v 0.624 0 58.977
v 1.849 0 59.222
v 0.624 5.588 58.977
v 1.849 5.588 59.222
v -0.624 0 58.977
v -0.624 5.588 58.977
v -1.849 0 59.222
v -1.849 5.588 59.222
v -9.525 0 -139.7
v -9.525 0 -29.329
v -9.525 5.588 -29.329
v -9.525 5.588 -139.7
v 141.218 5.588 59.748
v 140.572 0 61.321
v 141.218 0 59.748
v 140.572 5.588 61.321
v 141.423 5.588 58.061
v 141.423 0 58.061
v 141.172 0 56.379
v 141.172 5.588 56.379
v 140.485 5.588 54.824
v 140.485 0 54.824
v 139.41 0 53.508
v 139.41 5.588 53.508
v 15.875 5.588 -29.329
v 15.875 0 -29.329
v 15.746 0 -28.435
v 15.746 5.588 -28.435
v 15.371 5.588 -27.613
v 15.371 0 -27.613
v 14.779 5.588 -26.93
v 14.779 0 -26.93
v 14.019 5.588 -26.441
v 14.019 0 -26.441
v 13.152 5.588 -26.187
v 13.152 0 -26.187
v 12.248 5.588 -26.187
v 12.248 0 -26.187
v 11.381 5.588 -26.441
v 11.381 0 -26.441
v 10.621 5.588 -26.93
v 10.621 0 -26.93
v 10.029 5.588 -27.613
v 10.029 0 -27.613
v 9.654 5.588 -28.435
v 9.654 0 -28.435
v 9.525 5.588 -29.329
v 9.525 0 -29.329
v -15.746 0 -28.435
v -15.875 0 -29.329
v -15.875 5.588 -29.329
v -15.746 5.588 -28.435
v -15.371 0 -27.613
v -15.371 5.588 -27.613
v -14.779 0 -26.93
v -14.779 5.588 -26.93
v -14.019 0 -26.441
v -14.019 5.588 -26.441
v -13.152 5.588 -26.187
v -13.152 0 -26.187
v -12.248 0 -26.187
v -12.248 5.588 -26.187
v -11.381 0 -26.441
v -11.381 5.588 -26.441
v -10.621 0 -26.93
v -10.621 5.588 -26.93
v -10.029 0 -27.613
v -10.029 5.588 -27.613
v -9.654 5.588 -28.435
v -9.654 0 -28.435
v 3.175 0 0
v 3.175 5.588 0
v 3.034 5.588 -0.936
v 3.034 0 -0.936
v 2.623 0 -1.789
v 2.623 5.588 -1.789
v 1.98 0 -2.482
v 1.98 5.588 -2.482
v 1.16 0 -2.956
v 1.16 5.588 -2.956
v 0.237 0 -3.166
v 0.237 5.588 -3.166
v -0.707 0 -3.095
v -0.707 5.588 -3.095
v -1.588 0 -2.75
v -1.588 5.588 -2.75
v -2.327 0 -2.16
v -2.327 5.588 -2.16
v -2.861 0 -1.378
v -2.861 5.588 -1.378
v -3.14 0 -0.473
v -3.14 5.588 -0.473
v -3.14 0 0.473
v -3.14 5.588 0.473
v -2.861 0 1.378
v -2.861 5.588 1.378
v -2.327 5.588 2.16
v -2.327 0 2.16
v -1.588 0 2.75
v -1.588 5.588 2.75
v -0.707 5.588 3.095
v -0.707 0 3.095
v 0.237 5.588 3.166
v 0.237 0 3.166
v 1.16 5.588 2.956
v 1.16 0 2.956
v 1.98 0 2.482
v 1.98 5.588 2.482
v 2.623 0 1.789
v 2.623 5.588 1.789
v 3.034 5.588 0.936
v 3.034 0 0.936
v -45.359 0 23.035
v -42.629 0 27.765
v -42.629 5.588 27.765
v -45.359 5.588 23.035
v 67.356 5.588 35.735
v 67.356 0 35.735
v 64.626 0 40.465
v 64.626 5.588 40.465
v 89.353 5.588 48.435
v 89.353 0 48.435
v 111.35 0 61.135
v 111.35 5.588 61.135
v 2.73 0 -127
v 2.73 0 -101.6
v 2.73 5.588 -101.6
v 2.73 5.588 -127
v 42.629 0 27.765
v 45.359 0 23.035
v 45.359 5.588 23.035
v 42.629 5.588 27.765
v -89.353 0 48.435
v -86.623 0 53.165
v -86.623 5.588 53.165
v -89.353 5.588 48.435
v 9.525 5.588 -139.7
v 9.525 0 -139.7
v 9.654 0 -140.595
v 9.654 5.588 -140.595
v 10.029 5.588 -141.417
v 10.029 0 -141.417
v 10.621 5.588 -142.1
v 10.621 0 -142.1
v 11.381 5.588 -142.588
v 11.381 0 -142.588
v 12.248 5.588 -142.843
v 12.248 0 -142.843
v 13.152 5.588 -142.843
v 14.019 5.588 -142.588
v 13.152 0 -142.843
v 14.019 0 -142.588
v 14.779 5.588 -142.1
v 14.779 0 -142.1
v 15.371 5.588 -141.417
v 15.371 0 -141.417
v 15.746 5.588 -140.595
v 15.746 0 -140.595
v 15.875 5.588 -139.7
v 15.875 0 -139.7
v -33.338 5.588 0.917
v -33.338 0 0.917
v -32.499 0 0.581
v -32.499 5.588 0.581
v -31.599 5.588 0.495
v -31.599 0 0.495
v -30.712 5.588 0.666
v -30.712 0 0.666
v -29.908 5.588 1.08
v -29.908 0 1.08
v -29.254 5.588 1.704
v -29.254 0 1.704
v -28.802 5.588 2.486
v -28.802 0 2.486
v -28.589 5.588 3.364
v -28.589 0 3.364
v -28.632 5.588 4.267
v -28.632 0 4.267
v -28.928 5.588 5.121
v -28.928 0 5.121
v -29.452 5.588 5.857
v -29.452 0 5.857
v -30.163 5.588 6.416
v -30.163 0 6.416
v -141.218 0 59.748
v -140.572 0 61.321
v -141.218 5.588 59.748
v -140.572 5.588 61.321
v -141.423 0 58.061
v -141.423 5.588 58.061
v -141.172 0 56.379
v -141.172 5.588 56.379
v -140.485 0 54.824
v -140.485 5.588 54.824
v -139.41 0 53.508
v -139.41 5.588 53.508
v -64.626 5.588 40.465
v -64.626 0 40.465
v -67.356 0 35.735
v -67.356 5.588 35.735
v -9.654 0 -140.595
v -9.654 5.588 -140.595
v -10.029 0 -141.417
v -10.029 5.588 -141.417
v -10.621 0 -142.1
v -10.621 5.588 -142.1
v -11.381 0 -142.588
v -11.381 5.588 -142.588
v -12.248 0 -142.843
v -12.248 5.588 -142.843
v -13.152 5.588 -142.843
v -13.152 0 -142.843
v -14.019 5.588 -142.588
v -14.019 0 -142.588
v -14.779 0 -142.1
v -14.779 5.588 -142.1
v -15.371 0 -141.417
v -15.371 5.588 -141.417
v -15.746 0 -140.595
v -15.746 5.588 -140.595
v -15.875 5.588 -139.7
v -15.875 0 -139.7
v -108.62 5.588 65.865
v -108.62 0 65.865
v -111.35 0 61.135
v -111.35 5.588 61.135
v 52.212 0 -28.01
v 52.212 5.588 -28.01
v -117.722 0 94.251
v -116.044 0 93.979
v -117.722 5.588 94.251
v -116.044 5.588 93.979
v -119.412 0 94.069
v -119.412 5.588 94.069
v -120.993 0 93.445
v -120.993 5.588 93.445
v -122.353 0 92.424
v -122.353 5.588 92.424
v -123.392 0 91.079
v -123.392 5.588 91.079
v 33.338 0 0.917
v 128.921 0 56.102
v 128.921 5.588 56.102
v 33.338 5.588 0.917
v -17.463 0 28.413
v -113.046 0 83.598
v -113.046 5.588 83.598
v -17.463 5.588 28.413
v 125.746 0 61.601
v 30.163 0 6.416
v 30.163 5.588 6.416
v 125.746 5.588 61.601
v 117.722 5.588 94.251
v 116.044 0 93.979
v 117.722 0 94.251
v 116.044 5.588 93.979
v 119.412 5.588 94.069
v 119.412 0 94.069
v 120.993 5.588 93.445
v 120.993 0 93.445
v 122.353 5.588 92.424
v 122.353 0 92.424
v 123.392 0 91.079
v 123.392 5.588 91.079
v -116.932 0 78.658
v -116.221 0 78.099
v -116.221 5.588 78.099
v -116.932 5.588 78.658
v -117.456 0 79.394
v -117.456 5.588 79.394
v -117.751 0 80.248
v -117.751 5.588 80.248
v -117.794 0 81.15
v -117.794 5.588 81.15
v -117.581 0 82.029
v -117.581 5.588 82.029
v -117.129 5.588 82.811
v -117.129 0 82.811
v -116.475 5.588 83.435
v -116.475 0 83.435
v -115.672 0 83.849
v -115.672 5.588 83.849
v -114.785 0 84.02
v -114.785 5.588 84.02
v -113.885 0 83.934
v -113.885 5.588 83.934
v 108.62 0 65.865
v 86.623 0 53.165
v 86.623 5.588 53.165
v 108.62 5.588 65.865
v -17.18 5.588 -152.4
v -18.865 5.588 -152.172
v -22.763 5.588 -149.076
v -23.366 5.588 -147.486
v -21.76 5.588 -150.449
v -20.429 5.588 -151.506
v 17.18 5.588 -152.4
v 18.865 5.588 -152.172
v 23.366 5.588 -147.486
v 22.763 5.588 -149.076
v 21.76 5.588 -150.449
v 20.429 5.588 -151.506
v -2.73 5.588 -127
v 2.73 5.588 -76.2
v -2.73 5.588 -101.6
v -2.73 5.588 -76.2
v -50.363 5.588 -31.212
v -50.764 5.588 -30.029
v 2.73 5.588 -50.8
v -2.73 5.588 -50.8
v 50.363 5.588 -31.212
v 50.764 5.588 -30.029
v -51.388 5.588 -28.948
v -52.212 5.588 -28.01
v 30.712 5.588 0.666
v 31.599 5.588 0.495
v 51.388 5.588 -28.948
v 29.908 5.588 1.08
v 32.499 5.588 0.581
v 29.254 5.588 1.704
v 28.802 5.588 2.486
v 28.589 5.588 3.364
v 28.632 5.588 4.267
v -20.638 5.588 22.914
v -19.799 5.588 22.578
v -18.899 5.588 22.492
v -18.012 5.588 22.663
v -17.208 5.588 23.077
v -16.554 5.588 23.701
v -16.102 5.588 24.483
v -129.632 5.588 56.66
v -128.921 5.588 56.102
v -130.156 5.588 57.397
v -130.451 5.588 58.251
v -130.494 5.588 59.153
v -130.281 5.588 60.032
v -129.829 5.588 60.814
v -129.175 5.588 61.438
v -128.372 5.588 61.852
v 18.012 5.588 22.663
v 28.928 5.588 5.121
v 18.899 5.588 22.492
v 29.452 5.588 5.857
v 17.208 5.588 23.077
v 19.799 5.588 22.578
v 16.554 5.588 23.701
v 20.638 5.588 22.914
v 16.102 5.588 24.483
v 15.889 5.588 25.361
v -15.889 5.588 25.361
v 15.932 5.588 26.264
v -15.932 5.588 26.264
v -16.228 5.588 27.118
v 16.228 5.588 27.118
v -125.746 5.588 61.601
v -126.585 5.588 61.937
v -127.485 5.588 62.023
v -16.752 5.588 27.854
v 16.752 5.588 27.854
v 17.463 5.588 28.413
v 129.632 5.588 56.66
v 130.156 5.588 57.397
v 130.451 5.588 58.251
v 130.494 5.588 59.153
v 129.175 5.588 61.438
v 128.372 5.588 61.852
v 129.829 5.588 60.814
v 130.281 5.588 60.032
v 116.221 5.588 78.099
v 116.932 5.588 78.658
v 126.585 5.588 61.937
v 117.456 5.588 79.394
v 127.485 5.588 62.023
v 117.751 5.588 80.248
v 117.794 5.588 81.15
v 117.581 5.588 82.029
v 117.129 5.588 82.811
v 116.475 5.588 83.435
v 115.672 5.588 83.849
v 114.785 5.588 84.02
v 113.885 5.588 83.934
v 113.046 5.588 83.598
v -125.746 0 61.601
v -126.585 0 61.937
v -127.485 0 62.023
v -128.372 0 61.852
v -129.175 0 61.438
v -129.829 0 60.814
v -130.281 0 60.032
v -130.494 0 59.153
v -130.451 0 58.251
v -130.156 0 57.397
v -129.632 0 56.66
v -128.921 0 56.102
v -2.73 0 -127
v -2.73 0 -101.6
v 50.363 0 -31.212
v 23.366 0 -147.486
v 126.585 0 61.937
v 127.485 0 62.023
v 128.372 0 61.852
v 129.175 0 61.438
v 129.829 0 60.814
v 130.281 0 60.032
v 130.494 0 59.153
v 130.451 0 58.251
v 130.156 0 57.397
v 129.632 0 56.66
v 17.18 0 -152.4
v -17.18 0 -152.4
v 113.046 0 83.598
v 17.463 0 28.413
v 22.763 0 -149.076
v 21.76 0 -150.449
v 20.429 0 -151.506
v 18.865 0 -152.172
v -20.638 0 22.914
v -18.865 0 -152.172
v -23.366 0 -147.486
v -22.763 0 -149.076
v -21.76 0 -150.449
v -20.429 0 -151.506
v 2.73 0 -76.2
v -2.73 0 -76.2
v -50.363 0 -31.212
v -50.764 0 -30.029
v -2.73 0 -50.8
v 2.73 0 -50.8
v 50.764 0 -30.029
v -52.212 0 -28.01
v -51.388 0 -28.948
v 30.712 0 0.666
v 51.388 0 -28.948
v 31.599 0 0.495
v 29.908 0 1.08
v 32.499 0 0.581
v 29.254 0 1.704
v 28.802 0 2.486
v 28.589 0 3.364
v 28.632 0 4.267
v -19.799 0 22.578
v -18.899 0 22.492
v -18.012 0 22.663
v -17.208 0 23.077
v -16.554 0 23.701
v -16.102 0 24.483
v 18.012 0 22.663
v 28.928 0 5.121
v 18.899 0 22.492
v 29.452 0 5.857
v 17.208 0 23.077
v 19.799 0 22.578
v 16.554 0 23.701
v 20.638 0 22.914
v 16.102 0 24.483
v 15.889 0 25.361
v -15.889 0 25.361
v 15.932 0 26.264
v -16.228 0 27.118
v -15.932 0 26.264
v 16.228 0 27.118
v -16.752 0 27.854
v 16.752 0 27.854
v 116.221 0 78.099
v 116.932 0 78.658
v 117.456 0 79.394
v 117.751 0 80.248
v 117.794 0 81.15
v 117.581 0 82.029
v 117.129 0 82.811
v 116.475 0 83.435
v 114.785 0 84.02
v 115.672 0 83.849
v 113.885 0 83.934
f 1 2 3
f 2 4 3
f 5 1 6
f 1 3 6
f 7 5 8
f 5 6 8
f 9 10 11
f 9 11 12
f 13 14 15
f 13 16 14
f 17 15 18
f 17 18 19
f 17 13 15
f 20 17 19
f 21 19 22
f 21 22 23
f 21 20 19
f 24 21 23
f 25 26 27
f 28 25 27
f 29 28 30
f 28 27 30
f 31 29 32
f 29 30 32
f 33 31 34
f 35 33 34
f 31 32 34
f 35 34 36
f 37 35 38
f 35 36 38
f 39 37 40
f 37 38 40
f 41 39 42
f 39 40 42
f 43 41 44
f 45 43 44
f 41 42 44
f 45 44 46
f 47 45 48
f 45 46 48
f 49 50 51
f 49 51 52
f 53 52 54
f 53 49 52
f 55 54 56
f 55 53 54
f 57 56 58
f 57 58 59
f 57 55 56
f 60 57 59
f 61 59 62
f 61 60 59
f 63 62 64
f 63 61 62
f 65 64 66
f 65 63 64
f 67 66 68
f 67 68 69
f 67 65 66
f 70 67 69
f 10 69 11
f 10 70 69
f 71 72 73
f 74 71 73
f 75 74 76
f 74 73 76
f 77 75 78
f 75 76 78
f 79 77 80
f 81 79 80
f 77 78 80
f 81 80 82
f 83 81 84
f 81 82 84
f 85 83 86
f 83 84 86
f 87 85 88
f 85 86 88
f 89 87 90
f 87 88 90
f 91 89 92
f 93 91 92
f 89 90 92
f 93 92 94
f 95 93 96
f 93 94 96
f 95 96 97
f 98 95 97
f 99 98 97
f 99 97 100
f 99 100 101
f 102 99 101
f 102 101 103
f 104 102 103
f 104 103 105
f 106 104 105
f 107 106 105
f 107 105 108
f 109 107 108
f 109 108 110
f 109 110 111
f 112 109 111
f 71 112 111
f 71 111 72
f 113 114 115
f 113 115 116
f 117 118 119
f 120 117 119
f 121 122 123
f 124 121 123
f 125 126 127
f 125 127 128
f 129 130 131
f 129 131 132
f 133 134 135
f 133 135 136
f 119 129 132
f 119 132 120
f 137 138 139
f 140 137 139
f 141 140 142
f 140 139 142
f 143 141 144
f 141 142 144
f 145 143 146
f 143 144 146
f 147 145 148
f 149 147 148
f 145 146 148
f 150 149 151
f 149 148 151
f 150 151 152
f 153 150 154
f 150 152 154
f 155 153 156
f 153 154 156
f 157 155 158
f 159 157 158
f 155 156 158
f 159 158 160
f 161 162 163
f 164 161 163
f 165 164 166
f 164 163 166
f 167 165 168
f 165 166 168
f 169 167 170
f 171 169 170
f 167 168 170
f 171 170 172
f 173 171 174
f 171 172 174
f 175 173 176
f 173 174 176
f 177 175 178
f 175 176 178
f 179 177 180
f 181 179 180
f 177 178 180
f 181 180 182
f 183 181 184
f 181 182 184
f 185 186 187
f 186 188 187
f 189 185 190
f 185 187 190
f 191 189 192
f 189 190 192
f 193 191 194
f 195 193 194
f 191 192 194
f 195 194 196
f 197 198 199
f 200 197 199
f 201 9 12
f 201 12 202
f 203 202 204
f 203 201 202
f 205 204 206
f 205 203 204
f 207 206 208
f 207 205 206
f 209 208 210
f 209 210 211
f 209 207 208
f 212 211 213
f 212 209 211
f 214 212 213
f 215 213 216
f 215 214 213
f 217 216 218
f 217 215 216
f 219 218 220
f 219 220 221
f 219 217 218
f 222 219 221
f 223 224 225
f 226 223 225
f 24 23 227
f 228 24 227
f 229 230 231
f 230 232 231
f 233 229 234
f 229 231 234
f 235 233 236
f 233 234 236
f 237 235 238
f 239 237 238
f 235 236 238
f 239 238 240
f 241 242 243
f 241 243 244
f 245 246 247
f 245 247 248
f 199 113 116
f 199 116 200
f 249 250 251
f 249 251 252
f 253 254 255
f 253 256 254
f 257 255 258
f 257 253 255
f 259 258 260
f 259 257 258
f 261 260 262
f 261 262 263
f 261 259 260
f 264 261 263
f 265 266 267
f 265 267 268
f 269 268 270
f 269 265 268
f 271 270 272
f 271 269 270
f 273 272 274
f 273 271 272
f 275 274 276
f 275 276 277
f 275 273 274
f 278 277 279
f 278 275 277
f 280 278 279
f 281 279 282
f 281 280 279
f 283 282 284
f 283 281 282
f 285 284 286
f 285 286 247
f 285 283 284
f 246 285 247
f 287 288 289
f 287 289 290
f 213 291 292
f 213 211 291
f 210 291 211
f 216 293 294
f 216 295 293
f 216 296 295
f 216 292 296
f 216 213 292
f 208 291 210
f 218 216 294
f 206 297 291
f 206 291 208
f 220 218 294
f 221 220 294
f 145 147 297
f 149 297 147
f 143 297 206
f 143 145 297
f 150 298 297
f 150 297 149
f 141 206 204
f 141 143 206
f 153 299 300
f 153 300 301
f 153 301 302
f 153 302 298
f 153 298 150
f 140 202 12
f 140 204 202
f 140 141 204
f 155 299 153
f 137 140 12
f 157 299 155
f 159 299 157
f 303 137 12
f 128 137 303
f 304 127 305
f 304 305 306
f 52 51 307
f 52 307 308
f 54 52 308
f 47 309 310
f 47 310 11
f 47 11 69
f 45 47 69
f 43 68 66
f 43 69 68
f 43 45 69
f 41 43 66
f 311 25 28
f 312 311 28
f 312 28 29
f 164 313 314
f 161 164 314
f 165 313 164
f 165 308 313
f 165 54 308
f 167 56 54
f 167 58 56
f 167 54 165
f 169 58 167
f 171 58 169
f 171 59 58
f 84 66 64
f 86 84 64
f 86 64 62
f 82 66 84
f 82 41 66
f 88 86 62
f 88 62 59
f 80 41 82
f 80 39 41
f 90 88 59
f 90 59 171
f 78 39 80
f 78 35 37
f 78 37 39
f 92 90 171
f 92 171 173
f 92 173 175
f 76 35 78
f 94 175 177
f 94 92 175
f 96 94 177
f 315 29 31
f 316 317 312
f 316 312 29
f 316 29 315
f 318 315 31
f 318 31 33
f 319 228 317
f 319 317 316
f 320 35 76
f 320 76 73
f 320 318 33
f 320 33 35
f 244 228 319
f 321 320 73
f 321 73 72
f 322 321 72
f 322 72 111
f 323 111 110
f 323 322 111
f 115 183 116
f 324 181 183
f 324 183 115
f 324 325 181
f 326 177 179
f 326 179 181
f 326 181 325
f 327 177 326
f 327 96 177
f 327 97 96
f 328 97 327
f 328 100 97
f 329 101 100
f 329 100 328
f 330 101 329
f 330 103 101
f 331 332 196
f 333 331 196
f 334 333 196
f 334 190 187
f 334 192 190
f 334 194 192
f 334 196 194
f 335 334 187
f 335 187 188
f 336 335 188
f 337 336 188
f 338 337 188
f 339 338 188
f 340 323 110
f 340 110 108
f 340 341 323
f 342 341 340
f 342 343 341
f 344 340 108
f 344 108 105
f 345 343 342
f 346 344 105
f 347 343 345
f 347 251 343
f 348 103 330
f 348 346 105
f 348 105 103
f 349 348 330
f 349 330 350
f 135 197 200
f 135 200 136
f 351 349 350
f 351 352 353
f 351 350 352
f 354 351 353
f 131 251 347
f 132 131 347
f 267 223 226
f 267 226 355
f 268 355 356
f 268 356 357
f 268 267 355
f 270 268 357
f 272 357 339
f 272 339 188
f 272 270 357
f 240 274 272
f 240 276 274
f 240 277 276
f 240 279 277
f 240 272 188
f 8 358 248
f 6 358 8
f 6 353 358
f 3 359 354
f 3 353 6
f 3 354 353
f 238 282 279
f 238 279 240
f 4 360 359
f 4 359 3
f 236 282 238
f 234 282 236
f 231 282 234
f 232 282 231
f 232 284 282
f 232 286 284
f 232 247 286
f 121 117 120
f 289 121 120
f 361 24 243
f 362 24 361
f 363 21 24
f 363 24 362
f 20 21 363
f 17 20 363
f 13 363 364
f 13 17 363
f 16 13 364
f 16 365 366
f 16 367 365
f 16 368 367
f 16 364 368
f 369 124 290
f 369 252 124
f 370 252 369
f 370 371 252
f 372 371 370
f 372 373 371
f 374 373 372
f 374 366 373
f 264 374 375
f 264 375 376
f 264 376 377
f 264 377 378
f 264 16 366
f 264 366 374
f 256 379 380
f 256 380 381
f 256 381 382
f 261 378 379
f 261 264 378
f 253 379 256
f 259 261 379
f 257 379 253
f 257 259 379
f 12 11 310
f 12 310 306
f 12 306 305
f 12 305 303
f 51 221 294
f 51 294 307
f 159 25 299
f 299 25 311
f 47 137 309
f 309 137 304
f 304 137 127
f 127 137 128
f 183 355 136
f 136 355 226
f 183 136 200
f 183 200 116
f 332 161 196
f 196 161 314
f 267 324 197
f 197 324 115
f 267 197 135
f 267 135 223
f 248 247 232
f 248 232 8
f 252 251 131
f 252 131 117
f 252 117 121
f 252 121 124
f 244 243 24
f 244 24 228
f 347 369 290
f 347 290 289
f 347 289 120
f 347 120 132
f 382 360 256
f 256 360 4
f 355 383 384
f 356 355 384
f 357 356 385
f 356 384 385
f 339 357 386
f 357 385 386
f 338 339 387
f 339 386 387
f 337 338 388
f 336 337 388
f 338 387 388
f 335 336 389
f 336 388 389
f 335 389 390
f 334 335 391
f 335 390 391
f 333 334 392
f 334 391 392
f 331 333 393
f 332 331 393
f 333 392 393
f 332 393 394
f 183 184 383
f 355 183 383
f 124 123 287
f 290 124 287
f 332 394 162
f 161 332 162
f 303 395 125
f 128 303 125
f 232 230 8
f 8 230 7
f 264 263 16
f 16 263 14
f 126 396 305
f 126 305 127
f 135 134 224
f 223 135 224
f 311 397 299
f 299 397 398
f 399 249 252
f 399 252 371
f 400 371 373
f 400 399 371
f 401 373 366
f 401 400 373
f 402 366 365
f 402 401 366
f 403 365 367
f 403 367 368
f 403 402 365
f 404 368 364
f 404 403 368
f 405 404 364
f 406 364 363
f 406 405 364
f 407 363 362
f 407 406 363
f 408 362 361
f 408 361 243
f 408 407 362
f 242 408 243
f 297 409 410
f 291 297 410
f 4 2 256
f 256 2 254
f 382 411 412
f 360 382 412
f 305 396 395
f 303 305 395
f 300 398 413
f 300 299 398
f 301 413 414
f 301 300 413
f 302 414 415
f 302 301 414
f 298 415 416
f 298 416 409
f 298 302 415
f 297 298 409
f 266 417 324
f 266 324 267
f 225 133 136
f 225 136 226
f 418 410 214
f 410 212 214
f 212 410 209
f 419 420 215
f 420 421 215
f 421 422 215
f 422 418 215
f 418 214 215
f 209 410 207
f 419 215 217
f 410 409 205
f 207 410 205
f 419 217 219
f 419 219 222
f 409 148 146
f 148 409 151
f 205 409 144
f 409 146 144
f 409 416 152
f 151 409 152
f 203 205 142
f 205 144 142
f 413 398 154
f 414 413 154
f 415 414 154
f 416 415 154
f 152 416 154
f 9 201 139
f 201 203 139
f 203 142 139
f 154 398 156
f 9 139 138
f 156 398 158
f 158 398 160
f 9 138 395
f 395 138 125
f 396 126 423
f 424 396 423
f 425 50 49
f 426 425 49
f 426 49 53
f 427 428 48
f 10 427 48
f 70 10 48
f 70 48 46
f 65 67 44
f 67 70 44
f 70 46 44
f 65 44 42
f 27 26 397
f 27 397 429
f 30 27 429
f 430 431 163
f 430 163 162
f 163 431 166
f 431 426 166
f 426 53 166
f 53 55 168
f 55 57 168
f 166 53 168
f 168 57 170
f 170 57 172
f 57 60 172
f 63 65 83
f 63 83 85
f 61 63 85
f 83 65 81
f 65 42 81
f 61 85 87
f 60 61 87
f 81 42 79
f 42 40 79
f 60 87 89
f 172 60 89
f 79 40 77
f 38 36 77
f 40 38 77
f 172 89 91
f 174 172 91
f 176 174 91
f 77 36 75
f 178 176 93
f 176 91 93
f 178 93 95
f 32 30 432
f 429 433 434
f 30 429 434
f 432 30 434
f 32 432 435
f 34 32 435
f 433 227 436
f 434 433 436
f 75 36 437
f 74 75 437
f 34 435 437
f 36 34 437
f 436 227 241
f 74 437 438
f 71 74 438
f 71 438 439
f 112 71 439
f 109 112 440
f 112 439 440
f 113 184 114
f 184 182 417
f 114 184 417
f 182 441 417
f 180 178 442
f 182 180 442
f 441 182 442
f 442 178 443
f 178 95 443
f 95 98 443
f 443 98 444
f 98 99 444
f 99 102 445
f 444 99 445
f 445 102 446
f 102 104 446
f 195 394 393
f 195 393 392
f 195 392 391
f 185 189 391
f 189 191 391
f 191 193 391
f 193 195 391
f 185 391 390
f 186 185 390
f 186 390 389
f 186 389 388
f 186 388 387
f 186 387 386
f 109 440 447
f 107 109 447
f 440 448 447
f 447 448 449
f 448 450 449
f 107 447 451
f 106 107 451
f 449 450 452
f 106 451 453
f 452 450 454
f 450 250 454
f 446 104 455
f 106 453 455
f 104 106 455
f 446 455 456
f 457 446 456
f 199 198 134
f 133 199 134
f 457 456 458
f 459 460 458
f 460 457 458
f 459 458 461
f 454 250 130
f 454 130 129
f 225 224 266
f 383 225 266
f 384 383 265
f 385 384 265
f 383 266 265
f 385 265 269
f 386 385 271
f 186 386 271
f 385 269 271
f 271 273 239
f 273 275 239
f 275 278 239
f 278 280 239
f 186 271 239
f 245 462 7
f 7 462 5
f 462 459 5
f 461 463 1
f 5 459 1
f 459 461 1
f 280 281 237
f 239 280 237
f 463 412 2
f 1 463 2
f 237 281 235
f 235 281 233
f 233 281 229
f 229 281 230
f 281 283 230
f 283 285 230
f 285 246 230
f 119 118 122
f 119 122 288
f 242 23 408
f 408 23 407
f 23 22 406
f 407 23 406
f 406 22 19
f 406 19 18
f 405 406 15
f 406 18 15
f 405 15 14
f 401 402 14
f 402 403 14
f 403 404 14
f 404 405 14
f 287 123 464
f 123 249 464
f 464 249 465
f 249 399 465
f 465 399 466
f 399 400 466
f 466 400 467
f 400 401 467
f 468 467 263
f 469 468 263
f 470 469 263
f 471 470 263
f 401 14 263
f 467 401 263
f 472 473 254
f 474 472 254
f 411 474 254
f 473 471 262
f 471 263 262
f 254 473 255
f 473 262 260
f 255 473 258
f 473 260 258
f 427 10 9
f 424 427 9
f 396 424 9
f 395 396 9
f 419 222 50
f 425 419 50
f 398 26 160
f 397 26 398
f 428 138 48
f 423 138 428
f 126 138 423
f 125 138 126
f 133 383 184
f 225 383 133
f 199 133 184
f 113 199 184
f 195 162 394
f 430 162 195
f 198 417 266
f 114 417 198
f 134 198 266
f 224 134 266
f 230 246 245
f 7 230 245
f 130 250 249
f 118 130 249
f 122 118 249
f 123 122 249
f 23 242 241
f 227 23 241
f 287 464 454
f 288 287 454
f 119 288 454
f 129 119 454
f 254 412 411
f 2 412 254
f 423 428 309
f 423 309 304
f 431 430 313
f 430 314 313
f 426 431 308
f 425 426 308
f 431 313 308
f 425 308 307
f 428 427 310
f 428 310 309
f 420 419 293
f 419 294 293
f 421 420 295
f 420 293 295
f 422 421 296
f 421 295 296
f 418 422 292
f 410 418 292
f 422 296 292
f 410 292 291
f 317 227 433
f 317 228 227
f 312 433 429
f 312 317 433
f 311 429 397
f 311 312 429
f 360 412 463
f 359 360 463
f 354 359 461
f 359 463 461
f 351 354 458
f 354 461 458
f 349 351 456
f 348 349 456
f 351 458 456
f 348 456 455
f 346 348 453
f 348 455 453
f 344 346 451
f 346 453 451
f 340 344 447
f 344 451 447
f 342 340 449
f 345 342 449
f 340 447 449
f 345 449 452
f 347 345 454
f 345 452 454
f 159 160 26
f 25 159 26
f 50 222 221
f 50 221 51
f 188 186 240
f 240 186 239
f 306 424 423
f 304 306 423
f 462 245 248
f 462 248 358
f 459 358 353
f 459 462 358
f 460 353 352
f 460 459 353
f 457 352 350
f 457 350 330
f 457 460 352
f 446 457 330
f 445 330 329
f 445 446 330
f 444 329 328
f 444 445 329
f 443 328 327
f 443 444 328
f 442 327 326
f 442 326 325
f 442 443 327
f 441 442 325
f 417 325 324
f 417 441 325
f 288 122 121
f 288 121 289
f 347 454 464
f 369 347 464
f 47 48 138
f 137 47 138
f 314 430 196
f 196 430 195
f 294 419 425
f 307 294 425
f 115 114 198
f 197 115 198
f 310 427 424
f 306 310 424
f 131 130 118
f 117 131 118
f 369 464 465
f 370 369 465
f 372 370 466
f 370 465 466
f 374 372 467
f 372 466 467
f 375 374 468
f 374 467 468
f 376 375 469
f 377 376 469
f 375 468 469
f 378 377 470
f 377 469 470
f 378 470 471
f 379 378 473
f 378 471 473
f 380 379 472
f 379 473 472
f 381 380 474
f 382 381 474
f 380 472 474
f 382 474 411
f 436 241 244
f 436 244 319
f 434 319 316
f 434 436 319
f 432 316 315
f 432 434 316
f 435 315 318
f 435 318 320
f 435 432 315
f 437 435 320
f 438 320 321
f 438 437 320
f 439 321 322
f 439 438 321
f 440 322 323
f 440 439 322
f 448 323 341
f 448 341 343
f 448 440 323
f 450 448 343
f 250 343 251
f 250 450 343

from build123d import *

# Parameters (mm, degrees)
SKETCH1_W           = 5.461
SKETCH1_H           = 25.4
BOSS_EXTRUDE1_DEPTH = 5.588
CIRPATTERN1_COUNT   = 3
SKETCH3_R           = 3.175
CUT_EXTRUDE1_DEPTH  = 6.588
FILLET2_R           = 6.35


with BuildPart() as part:
    # Sketch1 → Boss-Extrude1 (new body)
    with BuildSketch(Plane(origin=(0, 0, 0), x_dir=(1, 0, 0), z_dir=(0, 1, 0))):
        Polygon((0, 0), (50.8, 29.329393675), (22.225, 152.4), (-22.225, 152.4), (-50.8, 29.329393675), align=None)
        with BuildLine():
            Line((-9.525, 29.329393675), (-9.525, 139.7))
            ThreePointArc((-9.525, 139.7), (-12.7, 142.875), (-15.875, 139.7))
            Line((-15.875, 139.7), (-15.875, 29.329393675))
            ThreePointArc((-15.875, 29.329393675), (-12.7, 26.154393675), (-9.525, 29.329393675))
        make_face(mode=Mode.SUBTRACT)
        with Locations((0, 63.5)):
            Rectangle(SKETCH1_W, SKETCH1_H, mode=Mode.SUBTRACT)
        with BuildLine():
            Line((9.525, 29.329393675), (9.525, 139.7))
            ThreePointArc((9.525, 139.7), (12.7, 142.875), (15.875, 139.7))
            Line((15.875, 139.7), (15.875, 29.329393675))
            ThreePointArc((15.875, 29.329393675), (12.7, 26.154393675), (9.525, 29.329393675))
        make_face(mode=Mode.SUBTRACT)
        with Locations((0, 114.3)):
            Rectangle(SKETCH1_W, SKETCH1_H, mode=Mode.SUBTRACT)
    boss_extrude1 = extrude(amount=BOSS_EXTRUDE1_DEPTH)

    # CirPattern1: Boss-Extrude1 ×3 about axis
    cirpattern1_axis = Axis((0, 0, 0), (0, 1, 0))
    for i in range(1, CIRPATTERN1_COUNT):
        add(boss_extrude1.rotate(cirpattern1_axis, i * 360 / CIRPATTERN1_COUNT))

    # Sketch3 → Cut-Extrude1 (cut, through all)
    with BuildSketch(Plane(origin=(0, 5.588, 0), x_dir=(1, 0, 0), z_dir=(0, 1, 0))):
        Circle(SKETCH3_R)
    extrude(amount=-CUT_EXTRUDE1_DEPTH, mode=Mode.SUBTRACT)

    # Fillet2
    fillet2_edges = [part.edges().sort_by_distance(p)[0] for p in [
        (-143.094771537, 2.794, 56.952585401),
        (-120.869771537, 2.794, 95.447414599),
        (-50.8, 2.794, -29.329393675),
        (-22.225, 2.794, -152.4),
        (22.225, 2.794, -152.4),
        (50.8, 2.794, -29.329393675),
        (0, 2.794, 58.65878735),
        (120.869771537, 2.794, 95.447414599),
        (143.094771537, 2.794, 56.952585401),
    ]]
    fillet(fillet2_edges, radius=FILLET2_R)


solid = part.part
